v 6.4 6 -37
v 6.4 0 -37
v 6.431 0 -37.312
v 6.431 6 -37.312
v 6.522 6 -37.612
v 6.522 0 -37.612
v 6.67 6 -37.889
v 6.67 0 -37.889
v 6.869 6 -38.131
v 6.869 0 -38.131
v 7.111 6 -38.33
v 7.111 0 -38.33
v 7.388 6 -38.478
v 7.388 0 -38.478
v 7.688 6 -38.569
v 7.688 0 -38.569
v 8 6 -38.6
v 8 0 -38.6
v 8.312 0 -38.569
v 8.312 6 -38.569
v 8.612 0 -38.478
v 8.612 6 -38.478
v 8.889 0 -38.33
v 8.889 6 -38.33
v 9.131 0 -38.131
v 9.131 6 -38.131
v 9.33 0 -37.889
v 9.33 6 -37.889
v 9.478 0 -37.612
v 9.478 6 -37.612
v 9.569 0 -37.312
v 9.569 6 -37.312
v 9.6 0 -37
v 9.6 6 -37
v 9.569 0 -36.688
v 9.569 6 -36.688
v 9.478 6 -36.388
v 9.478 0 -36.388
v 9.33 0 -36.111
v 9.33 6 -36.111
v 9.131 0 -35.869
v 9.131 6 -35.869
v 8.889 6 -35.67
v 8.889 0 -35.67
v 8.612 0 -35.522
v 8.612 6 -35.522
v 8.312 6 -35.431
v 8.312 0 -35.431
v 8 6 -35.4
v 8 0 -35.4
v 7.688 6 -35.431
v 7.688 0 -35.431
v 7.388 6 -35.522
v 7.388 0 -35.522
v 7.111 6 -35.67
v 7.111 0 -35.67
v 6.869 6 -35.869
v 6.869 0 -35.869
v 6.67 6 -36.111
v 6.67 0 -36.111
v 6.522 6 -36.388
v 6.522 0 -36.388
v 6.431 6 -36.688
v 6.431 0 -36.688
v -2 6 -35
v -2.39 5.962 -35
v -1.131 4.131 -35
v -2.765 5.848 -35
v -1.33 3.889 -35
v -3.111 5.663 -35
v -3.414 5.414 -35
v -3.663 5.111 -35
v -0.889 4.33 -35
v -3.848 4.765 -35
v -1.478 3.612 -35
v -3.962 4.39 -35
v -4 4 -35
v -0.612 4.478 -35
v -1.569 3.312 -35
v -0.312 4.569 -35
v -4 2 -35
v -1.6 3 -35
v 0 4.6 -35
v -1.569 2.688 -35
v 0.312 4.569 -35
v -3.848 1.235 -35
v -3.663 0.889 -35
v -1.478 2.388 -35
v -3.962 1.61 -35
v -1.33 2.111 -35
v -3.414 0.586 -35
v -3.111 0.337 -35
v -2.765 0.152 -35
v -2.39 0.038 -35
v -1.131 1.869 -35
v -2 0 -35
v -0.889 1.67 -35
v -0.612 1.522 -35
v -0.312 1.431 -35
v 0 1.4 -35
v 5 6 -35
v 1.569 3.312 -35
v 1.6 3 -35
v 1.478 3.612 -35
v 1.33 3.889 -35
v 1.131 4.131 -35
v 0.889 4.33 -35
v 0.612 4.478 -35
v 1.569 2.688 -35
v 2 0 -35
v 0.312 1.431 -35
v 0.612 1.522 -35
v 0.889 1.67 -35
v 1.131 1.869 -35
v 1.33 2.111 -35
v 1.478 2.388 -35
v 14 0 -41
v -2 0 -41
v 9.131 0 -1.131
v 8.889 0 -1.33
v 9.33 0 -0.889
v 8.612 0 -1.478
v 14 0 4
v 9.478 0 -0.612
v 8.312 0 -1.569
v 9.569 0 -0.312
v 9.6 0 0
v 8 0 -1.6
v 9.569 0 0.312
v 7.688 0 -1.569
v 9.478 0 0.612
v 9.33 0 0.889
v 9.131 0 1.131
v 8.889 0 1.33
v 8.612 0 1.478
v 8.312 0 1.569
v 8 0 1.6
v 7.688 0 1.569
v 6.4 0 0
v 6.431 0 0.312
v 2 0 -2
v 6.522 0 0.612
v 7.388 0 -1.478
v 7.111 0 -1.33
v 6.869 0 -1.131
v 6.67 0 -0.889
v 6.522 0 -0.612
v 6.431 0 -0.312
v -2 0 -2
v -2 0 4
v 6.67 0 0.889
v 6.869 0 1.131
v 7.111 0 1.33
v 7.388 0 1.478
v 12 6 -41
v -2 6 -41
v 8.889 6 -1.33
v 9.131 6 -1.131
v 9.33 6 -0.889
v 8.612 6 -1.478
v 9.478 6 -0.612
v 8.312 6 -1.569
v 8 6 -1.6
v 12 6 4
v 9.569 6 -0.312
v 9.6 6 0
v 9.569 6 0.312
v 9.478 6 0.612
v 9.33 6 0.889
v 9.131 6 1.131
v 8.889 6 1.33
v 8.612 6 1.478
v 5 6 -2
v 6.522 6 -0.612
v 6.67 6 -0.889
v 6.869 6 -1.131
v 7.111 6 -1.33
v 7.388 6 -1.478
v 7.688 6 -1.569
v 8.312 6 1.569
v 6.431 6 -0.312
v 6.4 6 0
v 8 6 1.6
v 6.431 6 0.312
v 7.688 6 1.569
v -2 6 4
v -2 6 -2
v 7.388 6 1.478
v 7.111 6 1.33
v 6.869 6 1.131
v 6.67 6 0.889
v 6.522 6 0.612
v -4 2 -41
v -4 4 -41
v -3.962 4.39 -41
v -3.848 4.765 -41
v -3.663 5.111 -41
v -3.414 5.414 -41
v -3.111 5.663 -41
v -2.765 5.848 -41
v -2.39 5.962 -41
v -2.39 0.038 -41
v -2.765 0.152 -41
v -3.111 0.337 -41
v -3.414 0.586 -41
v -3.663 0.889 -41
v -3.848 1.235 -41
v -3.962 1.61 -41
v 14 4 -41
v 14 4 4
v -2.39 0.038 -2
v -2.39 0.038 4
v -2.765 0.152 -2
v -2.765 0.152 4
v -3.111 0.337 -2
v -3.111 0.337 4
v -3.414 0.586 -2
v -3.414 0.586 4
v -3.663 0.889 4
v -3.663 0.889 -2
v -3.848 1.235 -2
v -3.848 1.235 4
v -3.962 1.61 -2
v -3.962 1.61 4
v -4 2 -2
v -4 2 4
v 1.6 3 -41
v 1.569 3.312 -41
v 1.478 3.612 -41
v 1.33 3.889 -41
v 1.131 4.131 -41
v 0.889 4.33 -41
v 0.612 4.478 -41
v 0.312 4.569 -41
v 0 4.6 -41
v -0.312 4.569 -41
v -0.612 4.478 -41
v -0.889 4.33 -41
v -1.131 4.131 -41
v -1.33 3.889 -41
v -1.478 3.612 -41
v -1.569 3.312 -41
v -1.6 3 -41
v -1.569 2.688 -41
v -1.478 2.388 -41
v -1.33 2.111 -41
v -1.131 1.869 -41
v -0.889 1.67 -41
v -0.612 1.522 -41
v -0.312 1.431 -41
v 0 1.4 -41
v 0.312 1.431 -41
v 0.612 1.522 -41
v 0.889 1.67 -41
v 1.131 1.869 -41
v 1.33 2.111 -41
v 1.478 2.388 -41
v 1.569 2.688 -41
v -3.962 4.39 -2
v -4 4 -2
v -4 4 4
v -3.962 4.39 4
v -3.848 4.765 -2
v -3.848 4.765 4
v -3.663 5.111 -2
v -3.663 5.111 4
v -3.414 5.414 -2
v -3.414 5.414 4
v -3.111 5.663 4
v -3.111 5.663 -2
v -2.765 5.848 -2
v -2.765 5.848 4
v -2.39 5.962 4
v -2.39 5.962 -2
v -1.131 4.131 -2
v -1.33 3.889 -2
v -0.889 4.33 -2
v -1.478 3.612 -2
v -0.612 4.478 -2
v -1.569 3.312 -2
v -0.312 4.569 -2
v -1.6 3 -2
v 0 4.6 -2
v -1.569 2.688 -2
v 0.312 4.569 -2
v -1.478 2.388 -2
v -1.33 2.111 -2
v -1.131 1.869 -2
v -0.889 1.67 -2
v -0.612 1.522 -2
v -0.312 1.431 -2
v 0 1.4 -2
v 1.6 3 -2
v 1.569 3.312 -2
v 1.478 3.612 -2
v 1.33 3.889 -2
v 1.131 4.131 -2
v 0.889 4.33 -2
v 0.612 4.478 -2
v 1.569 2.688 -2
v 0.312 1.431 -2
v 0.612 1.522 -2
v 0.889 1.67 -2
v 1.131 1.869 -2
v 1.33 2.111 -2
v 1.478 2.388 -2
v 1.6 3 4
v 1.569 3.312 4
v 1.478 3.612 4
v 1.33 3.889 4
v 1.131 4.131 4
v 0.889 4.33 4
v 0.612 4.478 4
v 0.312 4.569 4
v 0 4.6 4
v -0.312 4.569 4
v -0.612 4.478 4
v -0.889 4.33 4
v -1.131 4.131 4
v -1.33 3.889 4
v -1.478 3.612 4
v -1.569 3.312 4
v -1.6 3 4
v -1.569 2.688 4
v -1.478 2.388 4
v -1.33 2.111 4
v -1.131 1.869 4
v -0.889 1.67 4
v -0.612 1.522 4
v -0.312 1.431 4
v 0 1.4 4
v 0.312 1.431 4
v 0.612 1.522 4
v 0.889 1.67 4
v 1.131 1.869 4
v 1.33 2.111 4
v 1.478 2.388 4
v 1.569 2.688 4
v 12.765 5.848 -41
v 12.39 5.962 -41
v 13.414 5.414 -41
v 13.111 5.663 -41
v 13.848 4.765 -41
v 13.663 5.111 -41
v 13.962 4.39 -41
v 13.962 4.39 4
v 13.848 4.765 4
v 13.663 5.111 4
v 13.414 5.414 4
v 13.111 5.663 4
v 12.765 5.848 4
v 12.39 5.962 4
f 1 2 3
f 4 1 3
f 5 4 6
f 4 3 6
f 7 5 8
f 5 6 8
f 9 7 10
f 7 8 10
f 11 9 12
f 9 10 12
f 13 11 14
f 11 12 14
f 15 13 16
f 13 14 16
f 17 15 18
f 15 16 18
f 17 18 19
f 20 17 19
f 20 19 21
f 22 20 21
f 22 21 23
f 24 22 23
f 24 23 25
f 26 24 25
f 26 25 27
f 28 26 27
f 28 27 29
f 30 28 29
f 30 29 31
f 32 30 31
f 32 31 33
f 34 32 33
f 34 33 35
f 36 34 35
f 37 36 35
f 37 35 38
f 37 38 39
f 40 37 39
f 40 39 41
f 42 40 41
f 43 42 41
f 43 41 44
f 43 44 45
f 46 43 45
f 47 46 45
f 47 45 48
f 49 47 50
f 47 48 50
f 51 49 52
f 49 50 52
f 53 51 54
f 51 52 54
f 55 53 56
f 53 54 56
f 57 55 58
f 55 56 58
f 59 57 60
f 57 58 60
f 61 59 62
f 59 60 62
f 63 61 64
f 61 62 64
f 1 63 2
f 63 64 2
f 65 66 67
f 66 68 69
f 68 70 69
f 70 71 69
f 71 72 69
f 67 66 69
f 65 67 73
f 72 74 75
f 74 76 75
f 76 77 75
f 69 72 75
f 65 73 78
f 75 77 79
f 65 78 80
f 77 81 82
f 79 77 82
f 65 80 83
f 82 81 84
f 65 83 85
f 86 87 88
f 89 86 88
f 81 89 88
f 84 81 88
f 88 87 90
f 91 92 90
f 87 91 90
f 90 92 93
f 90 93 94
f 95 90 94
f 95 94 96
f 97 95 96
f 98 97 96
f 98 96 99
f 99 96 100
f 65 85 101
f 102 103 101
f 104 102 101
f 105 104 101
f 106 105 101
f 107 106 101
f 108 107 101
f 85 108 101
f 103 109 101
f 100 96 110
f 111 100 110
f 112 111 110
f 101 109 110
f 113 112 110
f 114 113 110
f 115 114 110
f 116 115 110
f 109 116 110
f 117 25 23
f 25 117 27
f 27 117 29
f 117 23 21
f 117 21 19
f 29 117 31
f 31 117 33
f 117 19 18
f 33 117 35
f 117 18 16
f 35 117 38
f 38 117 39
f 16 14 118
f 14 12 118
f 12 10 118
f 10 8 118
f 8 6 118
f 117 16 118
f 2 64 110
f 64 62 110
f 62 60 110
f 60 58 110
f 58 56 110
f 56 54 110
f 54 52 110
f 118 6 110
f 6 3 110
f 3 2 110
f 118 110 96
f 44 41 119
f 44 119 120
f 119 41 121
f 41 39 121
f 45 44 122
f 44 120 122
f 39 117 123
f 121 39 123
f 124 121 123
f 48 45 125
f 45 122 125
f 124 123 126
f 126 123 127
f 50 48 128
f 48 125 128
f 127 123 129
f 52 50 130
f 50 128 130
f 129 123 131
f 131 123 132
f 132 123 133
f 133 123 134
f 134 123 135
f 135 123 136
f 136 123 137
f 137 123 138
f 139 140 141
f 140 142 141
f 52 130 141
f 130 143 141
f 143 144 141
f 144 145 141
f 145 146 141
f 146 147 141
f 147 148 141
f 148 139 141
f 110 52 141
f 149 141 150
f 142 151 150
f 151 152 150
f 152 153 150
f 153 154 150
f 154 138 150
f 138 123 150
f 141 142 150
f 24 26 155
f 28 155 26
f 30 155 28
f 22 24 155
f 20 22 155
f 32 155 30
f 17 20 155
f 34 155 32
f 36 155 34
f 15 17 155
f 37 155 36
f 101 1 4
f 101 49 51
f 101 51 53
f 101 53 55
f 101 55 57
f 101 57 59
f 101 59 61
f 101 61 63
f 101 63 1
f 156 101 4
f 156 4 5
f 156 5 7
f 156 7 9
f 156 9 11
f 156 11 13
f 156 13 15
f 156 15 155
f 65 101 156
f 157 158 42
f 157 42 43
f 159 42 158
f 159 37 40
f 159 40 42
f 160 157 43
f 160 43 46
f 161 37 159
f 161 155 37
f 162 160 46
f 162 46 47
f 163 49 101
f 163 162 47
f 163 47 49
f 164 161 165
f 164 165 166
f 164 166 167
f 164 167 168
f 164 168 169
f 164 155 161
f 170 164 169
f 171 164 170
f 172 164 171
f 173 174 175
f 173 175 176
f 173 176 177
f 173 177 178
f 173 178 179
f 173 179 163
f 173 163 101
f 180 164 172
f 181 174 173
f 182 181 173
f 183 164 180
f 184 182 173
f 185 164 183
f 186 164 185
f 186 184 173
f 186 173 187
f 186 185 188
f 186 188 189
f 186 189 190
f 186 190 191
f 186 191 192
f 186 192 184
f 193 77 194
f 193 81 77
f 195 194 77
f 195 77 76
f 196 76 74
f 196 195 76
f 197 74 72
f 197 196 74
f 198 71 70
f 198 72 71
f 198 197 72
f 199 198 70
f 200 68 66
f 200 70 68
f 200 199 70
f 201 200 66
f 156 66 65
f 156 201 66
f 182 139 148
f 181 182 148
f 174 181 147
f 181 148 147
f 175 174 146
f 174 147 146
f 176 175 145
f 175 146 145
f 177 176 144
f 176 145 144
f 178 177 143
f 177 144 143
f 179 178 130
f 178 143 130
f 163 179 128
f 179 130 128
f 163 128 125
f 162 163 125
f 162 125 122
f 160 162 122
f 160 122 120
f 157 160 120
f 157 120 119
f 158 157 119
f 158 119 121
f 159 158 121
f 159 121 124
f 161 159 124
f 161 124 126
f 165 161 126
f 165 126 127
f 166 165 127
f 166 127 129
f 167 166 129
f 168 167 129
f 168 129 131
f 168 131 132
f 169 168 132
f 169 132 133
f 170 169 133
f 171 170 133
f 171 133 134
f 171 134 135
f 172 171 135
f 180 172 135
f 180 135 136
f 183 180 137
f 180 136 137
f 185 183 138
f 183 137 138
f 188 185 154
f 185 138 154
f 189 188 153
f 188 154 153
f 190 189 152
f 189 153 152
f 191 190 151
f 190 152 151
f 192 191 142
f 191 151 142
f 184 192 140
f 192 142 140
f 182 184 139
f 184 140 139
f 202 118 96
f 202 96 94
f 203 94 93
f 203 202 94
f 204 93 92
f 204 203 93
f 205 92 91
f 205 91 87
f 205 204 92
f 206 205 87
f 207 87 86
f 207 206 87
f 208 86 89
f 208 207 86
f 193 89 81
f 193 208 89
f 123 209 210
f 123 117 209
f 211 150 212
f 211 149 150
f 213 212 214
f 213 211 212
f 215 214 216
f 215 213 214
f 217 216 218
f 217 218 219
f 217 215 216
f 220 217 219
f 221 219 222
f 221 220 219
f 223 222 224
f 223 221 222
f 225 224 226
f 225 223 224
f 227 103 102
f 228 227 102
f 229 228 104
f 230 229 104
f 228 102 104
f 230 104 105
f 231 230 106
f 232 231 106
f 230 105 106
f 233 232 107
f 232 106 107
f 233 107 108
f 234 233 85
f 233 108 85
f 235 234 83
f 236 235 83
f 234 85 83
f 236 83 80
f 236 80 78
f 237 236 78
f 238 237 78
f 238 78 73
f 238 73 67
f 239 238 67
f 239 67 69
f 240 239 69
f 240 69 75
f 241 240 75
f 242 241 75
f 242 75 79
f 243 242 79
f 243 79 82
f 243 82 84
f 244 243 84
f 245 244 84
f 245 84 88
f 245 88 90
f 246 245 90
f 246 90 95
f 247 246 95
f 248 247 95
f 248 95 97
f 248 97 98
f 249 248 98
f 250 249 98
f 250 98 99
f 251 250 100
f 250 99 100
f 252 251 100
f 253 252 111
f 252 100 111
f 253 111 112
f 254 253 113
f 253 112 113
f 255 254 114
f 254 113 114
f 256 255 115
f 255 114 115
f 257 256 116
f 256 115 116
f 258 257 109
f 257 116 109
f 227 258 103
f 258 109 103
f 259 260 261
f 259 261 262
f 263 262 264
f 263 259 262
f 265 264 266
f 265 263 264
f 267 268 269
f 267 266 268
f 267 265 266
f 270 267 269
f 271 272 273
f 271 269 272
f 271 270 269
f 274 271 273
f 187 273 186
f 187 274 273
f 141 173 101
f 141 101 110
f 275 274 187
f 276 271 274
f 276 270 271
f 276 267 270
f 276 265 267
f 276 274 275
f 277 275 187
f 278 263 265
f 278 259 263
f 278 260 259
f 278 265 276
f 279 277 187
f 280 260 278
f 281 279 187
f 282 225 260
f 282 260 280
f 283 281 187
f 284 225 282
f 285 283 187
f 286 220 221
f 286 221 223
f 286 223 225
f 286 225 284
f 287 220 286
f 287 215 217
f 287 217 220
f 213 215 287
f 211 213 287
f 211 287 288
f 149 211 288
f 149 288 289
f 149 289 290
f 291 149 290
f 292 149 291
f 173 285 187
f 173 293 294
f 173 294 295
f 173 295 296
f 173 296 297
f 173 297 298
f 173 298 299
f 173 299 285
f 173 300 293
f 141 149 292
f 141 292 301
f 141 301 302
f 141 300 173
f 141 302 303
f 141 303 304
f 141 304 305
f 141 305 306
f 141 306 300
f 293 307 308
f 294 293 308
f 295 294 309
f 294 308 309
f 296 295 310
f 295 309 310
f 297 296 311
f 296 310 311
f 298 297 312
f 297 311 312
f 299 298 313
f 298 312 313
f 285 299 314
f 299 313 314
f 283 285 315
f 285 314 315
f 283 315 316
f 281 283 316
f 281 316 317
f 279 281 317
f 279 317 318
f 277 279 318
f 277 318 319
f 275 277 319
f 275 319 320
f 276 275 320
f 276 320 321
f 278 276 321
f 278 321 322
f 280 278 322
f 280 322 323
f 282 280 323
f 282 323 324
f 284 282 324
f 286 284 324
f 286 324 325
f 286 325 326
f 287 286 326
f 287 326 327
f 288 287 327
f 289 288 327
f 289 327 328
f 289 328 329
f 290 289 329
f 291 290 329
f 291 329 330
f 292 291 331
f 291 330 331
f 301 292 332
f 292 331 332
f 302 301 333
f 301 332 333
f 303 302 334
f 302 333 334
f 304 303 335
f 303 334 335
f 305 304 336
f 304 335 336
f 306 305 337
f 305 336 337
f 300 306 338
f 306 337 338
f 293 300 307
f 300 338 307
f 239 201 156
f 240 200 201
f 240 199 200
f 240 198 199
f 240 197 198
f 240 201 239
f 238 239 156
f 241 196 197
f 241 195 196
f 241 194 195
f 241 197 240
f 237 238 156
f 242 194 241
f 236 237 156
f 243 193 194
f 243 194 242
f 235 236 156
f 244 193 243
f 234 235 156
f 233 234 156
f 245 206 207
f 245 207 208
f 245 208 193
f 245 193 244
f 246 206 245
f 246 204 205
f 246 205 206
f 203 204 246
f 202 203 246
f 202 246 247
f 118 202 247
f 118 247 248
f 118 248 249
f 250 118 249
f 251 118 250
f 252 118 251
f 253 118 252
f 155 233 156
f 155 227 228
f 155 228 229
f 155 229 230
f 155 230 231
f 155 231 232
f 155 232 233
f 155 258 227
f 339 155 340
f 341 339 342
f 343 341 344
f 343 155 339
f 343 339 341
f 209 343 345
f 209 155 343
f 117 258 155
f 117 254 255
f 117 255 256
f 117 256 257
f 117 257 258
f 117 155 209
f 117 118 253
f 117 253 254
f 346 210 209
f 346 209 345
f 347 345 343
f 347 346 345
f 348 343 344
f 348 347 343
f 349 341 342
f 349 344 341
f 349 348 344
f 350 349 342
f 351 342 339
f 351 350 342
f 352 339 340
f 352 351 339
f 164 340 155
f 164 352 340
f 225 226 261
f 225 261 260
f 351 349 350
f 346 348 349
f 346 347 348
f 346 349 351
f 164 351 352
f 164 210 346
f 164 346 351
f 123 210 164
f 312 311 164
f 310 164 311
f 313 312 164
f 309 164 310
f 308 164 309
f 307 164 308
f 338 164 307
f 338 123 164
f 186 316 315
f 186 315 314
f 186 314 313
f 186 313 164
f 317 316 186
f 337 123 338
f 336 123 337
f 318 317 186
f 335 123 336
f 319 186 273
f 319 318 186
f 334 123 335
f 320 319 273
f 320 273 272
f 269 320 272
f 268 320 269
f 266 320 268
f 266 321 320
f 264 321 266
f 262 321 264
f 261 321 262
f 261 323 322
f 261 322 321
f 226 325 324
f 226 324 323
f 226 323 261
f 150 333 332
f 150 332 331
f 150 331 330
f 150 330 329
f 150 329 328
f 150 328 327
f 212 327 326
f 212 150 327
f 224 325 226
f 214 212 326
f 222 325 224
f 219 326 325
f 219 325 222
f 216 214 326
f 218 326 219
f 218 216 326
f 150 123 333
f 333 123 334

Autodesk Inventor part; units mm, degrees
ref_plane "YZ Plane" through (0, 0, 0) normal (1, 0, 0) x (0, 1, 0)
ref_plane "XZ Plane" through (0, 0, 0) normal (0, 1, 0) x (-1, 0, 0)
ref_plane "XY Plane" through (0, 0, 0) normal (0, 0, 1) x (1, 0, 0)
sketch "Эскиз1" plane through (0, 0, 0) normal (0, 1, 0) x (-1, 0, 0)
  line L0 (0, 0) -> (-8, 0)
  line L1 (-8, 0) -> (-8, -37)
  line L2 (-8, -37) -> (0, -37)
  line L3 (0, -37) -> (0, 0)
  circle A0 centre (-8, 0) radius 1.6
  line L4 (-8, -37) -> (-2, -37)
  line L5 (-2, -37) -> (-2, -41)
  line L6 (-2, -41) -> (-14, -41)
  line L7 (-14, -41) -> (-14, 4)
  line L8 (-14, 4) -> (0, 4)
  line L9 (0, 4) -> (0, 0)
  line L10 (-2, -41) -> (0, -41)
  line L11 (0, -41) -> (0, -37)
  line L12 (0, 4) -> (4, 4)
  line L13 (4, 4) -> (4, -41)
  line L14 (4, -41) -> (0, -41)
  line L15 (0, -41) -> (0, 4)
  line L16 (4, 4) -> (4, -2)
  line L17 (4, -2) -> (-2, -2)
  line L18 (-2, -2) -> (-2, -37)
  line L19 (4, -41) -> (4, -35)
  line L20 (4, -35) -> (-2, -35)
  circle A1 centre (-8, -37) radius 1.6
  dimension "d0" = 8
  dimension "d1" = 37
  dimension "d2" = 3.2
  dimension "d4" = 6
  dimension "d5" = 4
  dimension "d6" = 12
  dimension "d7" = 45
  dimension "d10" = 4
  dimension "d13" = 6
  dimension "d14" = 6
  dimension "d15" = 6
  dimension "d28" = 3.2
extrude "Выдавливание1" add sketch "Эскиз1" along normal blind 6 contours L3 L17 L18 L2 A1 L1 A0 L0 | L9 L12 L13 L17 L3 | L0 A0 L1 A1 L2 L5 L6 L7 L8 L9 | L20 L13 L14 L11 L3 | L3 L2 L18 L20 | L11 L10 L5 L2
sketch "Эскиз3" plane through (-4, 0, 4) normal (0, 0, 1) x (1, 0, 0)
  line L0 (0, 0) -> (18, 0) projected
  line L1 (0, 0) -> (4, 0)
  line L2 (4, 0) -> (4, 3)
  line L3 (4, 3) -> (0, 3)
  line L4 (0, 3) -> (0, 0)
  circle A0 centre (4, 3) radius 1.6
  dimension "d16" = 4
  dimension "d17" = 3
  dimension "d18" = 3.2
extrude "Выдавливание2" cut sketch "Эскиз3" against normal blind 45 contours A0 L3 L2 | L2 L3 A0
fillet "Сопряжение2" radius 2 5 edges at (-4, 6, 1) (-4, 6, -38) (-4, 0, -38) (-4, 0, 1) (14, 6, -18.5)
sketch "Эскиз5" plane through (2, 0, -2) normal (0, 0, -1) x (-1, 0, 0)
  line L0 (0, 0) -> (0, 6) projected
  line L1 (0, 0) -> (6.2917, 0) construction
  line L2 (0, 0) -> (-3.4641, 6)
  line L3 (-10, 6) -> (4, 6) projected
  line L4 (0, 0) -> (6.9282, 0) construction
  line L5 (0, 6) -> (-3, 6)
  line L6 (-3, 6) -> (0, 0)
  line L7 (0, 0) -> (0, 6)
  point P0 (2, 0)
  dimension "d24" = 120
  dimension "d25" = 3
extrude "Выдавливание3" cut sketch "Эскиз5" along normal blind 33 contours L6 L3 L0
properties part number "krepleniye"
